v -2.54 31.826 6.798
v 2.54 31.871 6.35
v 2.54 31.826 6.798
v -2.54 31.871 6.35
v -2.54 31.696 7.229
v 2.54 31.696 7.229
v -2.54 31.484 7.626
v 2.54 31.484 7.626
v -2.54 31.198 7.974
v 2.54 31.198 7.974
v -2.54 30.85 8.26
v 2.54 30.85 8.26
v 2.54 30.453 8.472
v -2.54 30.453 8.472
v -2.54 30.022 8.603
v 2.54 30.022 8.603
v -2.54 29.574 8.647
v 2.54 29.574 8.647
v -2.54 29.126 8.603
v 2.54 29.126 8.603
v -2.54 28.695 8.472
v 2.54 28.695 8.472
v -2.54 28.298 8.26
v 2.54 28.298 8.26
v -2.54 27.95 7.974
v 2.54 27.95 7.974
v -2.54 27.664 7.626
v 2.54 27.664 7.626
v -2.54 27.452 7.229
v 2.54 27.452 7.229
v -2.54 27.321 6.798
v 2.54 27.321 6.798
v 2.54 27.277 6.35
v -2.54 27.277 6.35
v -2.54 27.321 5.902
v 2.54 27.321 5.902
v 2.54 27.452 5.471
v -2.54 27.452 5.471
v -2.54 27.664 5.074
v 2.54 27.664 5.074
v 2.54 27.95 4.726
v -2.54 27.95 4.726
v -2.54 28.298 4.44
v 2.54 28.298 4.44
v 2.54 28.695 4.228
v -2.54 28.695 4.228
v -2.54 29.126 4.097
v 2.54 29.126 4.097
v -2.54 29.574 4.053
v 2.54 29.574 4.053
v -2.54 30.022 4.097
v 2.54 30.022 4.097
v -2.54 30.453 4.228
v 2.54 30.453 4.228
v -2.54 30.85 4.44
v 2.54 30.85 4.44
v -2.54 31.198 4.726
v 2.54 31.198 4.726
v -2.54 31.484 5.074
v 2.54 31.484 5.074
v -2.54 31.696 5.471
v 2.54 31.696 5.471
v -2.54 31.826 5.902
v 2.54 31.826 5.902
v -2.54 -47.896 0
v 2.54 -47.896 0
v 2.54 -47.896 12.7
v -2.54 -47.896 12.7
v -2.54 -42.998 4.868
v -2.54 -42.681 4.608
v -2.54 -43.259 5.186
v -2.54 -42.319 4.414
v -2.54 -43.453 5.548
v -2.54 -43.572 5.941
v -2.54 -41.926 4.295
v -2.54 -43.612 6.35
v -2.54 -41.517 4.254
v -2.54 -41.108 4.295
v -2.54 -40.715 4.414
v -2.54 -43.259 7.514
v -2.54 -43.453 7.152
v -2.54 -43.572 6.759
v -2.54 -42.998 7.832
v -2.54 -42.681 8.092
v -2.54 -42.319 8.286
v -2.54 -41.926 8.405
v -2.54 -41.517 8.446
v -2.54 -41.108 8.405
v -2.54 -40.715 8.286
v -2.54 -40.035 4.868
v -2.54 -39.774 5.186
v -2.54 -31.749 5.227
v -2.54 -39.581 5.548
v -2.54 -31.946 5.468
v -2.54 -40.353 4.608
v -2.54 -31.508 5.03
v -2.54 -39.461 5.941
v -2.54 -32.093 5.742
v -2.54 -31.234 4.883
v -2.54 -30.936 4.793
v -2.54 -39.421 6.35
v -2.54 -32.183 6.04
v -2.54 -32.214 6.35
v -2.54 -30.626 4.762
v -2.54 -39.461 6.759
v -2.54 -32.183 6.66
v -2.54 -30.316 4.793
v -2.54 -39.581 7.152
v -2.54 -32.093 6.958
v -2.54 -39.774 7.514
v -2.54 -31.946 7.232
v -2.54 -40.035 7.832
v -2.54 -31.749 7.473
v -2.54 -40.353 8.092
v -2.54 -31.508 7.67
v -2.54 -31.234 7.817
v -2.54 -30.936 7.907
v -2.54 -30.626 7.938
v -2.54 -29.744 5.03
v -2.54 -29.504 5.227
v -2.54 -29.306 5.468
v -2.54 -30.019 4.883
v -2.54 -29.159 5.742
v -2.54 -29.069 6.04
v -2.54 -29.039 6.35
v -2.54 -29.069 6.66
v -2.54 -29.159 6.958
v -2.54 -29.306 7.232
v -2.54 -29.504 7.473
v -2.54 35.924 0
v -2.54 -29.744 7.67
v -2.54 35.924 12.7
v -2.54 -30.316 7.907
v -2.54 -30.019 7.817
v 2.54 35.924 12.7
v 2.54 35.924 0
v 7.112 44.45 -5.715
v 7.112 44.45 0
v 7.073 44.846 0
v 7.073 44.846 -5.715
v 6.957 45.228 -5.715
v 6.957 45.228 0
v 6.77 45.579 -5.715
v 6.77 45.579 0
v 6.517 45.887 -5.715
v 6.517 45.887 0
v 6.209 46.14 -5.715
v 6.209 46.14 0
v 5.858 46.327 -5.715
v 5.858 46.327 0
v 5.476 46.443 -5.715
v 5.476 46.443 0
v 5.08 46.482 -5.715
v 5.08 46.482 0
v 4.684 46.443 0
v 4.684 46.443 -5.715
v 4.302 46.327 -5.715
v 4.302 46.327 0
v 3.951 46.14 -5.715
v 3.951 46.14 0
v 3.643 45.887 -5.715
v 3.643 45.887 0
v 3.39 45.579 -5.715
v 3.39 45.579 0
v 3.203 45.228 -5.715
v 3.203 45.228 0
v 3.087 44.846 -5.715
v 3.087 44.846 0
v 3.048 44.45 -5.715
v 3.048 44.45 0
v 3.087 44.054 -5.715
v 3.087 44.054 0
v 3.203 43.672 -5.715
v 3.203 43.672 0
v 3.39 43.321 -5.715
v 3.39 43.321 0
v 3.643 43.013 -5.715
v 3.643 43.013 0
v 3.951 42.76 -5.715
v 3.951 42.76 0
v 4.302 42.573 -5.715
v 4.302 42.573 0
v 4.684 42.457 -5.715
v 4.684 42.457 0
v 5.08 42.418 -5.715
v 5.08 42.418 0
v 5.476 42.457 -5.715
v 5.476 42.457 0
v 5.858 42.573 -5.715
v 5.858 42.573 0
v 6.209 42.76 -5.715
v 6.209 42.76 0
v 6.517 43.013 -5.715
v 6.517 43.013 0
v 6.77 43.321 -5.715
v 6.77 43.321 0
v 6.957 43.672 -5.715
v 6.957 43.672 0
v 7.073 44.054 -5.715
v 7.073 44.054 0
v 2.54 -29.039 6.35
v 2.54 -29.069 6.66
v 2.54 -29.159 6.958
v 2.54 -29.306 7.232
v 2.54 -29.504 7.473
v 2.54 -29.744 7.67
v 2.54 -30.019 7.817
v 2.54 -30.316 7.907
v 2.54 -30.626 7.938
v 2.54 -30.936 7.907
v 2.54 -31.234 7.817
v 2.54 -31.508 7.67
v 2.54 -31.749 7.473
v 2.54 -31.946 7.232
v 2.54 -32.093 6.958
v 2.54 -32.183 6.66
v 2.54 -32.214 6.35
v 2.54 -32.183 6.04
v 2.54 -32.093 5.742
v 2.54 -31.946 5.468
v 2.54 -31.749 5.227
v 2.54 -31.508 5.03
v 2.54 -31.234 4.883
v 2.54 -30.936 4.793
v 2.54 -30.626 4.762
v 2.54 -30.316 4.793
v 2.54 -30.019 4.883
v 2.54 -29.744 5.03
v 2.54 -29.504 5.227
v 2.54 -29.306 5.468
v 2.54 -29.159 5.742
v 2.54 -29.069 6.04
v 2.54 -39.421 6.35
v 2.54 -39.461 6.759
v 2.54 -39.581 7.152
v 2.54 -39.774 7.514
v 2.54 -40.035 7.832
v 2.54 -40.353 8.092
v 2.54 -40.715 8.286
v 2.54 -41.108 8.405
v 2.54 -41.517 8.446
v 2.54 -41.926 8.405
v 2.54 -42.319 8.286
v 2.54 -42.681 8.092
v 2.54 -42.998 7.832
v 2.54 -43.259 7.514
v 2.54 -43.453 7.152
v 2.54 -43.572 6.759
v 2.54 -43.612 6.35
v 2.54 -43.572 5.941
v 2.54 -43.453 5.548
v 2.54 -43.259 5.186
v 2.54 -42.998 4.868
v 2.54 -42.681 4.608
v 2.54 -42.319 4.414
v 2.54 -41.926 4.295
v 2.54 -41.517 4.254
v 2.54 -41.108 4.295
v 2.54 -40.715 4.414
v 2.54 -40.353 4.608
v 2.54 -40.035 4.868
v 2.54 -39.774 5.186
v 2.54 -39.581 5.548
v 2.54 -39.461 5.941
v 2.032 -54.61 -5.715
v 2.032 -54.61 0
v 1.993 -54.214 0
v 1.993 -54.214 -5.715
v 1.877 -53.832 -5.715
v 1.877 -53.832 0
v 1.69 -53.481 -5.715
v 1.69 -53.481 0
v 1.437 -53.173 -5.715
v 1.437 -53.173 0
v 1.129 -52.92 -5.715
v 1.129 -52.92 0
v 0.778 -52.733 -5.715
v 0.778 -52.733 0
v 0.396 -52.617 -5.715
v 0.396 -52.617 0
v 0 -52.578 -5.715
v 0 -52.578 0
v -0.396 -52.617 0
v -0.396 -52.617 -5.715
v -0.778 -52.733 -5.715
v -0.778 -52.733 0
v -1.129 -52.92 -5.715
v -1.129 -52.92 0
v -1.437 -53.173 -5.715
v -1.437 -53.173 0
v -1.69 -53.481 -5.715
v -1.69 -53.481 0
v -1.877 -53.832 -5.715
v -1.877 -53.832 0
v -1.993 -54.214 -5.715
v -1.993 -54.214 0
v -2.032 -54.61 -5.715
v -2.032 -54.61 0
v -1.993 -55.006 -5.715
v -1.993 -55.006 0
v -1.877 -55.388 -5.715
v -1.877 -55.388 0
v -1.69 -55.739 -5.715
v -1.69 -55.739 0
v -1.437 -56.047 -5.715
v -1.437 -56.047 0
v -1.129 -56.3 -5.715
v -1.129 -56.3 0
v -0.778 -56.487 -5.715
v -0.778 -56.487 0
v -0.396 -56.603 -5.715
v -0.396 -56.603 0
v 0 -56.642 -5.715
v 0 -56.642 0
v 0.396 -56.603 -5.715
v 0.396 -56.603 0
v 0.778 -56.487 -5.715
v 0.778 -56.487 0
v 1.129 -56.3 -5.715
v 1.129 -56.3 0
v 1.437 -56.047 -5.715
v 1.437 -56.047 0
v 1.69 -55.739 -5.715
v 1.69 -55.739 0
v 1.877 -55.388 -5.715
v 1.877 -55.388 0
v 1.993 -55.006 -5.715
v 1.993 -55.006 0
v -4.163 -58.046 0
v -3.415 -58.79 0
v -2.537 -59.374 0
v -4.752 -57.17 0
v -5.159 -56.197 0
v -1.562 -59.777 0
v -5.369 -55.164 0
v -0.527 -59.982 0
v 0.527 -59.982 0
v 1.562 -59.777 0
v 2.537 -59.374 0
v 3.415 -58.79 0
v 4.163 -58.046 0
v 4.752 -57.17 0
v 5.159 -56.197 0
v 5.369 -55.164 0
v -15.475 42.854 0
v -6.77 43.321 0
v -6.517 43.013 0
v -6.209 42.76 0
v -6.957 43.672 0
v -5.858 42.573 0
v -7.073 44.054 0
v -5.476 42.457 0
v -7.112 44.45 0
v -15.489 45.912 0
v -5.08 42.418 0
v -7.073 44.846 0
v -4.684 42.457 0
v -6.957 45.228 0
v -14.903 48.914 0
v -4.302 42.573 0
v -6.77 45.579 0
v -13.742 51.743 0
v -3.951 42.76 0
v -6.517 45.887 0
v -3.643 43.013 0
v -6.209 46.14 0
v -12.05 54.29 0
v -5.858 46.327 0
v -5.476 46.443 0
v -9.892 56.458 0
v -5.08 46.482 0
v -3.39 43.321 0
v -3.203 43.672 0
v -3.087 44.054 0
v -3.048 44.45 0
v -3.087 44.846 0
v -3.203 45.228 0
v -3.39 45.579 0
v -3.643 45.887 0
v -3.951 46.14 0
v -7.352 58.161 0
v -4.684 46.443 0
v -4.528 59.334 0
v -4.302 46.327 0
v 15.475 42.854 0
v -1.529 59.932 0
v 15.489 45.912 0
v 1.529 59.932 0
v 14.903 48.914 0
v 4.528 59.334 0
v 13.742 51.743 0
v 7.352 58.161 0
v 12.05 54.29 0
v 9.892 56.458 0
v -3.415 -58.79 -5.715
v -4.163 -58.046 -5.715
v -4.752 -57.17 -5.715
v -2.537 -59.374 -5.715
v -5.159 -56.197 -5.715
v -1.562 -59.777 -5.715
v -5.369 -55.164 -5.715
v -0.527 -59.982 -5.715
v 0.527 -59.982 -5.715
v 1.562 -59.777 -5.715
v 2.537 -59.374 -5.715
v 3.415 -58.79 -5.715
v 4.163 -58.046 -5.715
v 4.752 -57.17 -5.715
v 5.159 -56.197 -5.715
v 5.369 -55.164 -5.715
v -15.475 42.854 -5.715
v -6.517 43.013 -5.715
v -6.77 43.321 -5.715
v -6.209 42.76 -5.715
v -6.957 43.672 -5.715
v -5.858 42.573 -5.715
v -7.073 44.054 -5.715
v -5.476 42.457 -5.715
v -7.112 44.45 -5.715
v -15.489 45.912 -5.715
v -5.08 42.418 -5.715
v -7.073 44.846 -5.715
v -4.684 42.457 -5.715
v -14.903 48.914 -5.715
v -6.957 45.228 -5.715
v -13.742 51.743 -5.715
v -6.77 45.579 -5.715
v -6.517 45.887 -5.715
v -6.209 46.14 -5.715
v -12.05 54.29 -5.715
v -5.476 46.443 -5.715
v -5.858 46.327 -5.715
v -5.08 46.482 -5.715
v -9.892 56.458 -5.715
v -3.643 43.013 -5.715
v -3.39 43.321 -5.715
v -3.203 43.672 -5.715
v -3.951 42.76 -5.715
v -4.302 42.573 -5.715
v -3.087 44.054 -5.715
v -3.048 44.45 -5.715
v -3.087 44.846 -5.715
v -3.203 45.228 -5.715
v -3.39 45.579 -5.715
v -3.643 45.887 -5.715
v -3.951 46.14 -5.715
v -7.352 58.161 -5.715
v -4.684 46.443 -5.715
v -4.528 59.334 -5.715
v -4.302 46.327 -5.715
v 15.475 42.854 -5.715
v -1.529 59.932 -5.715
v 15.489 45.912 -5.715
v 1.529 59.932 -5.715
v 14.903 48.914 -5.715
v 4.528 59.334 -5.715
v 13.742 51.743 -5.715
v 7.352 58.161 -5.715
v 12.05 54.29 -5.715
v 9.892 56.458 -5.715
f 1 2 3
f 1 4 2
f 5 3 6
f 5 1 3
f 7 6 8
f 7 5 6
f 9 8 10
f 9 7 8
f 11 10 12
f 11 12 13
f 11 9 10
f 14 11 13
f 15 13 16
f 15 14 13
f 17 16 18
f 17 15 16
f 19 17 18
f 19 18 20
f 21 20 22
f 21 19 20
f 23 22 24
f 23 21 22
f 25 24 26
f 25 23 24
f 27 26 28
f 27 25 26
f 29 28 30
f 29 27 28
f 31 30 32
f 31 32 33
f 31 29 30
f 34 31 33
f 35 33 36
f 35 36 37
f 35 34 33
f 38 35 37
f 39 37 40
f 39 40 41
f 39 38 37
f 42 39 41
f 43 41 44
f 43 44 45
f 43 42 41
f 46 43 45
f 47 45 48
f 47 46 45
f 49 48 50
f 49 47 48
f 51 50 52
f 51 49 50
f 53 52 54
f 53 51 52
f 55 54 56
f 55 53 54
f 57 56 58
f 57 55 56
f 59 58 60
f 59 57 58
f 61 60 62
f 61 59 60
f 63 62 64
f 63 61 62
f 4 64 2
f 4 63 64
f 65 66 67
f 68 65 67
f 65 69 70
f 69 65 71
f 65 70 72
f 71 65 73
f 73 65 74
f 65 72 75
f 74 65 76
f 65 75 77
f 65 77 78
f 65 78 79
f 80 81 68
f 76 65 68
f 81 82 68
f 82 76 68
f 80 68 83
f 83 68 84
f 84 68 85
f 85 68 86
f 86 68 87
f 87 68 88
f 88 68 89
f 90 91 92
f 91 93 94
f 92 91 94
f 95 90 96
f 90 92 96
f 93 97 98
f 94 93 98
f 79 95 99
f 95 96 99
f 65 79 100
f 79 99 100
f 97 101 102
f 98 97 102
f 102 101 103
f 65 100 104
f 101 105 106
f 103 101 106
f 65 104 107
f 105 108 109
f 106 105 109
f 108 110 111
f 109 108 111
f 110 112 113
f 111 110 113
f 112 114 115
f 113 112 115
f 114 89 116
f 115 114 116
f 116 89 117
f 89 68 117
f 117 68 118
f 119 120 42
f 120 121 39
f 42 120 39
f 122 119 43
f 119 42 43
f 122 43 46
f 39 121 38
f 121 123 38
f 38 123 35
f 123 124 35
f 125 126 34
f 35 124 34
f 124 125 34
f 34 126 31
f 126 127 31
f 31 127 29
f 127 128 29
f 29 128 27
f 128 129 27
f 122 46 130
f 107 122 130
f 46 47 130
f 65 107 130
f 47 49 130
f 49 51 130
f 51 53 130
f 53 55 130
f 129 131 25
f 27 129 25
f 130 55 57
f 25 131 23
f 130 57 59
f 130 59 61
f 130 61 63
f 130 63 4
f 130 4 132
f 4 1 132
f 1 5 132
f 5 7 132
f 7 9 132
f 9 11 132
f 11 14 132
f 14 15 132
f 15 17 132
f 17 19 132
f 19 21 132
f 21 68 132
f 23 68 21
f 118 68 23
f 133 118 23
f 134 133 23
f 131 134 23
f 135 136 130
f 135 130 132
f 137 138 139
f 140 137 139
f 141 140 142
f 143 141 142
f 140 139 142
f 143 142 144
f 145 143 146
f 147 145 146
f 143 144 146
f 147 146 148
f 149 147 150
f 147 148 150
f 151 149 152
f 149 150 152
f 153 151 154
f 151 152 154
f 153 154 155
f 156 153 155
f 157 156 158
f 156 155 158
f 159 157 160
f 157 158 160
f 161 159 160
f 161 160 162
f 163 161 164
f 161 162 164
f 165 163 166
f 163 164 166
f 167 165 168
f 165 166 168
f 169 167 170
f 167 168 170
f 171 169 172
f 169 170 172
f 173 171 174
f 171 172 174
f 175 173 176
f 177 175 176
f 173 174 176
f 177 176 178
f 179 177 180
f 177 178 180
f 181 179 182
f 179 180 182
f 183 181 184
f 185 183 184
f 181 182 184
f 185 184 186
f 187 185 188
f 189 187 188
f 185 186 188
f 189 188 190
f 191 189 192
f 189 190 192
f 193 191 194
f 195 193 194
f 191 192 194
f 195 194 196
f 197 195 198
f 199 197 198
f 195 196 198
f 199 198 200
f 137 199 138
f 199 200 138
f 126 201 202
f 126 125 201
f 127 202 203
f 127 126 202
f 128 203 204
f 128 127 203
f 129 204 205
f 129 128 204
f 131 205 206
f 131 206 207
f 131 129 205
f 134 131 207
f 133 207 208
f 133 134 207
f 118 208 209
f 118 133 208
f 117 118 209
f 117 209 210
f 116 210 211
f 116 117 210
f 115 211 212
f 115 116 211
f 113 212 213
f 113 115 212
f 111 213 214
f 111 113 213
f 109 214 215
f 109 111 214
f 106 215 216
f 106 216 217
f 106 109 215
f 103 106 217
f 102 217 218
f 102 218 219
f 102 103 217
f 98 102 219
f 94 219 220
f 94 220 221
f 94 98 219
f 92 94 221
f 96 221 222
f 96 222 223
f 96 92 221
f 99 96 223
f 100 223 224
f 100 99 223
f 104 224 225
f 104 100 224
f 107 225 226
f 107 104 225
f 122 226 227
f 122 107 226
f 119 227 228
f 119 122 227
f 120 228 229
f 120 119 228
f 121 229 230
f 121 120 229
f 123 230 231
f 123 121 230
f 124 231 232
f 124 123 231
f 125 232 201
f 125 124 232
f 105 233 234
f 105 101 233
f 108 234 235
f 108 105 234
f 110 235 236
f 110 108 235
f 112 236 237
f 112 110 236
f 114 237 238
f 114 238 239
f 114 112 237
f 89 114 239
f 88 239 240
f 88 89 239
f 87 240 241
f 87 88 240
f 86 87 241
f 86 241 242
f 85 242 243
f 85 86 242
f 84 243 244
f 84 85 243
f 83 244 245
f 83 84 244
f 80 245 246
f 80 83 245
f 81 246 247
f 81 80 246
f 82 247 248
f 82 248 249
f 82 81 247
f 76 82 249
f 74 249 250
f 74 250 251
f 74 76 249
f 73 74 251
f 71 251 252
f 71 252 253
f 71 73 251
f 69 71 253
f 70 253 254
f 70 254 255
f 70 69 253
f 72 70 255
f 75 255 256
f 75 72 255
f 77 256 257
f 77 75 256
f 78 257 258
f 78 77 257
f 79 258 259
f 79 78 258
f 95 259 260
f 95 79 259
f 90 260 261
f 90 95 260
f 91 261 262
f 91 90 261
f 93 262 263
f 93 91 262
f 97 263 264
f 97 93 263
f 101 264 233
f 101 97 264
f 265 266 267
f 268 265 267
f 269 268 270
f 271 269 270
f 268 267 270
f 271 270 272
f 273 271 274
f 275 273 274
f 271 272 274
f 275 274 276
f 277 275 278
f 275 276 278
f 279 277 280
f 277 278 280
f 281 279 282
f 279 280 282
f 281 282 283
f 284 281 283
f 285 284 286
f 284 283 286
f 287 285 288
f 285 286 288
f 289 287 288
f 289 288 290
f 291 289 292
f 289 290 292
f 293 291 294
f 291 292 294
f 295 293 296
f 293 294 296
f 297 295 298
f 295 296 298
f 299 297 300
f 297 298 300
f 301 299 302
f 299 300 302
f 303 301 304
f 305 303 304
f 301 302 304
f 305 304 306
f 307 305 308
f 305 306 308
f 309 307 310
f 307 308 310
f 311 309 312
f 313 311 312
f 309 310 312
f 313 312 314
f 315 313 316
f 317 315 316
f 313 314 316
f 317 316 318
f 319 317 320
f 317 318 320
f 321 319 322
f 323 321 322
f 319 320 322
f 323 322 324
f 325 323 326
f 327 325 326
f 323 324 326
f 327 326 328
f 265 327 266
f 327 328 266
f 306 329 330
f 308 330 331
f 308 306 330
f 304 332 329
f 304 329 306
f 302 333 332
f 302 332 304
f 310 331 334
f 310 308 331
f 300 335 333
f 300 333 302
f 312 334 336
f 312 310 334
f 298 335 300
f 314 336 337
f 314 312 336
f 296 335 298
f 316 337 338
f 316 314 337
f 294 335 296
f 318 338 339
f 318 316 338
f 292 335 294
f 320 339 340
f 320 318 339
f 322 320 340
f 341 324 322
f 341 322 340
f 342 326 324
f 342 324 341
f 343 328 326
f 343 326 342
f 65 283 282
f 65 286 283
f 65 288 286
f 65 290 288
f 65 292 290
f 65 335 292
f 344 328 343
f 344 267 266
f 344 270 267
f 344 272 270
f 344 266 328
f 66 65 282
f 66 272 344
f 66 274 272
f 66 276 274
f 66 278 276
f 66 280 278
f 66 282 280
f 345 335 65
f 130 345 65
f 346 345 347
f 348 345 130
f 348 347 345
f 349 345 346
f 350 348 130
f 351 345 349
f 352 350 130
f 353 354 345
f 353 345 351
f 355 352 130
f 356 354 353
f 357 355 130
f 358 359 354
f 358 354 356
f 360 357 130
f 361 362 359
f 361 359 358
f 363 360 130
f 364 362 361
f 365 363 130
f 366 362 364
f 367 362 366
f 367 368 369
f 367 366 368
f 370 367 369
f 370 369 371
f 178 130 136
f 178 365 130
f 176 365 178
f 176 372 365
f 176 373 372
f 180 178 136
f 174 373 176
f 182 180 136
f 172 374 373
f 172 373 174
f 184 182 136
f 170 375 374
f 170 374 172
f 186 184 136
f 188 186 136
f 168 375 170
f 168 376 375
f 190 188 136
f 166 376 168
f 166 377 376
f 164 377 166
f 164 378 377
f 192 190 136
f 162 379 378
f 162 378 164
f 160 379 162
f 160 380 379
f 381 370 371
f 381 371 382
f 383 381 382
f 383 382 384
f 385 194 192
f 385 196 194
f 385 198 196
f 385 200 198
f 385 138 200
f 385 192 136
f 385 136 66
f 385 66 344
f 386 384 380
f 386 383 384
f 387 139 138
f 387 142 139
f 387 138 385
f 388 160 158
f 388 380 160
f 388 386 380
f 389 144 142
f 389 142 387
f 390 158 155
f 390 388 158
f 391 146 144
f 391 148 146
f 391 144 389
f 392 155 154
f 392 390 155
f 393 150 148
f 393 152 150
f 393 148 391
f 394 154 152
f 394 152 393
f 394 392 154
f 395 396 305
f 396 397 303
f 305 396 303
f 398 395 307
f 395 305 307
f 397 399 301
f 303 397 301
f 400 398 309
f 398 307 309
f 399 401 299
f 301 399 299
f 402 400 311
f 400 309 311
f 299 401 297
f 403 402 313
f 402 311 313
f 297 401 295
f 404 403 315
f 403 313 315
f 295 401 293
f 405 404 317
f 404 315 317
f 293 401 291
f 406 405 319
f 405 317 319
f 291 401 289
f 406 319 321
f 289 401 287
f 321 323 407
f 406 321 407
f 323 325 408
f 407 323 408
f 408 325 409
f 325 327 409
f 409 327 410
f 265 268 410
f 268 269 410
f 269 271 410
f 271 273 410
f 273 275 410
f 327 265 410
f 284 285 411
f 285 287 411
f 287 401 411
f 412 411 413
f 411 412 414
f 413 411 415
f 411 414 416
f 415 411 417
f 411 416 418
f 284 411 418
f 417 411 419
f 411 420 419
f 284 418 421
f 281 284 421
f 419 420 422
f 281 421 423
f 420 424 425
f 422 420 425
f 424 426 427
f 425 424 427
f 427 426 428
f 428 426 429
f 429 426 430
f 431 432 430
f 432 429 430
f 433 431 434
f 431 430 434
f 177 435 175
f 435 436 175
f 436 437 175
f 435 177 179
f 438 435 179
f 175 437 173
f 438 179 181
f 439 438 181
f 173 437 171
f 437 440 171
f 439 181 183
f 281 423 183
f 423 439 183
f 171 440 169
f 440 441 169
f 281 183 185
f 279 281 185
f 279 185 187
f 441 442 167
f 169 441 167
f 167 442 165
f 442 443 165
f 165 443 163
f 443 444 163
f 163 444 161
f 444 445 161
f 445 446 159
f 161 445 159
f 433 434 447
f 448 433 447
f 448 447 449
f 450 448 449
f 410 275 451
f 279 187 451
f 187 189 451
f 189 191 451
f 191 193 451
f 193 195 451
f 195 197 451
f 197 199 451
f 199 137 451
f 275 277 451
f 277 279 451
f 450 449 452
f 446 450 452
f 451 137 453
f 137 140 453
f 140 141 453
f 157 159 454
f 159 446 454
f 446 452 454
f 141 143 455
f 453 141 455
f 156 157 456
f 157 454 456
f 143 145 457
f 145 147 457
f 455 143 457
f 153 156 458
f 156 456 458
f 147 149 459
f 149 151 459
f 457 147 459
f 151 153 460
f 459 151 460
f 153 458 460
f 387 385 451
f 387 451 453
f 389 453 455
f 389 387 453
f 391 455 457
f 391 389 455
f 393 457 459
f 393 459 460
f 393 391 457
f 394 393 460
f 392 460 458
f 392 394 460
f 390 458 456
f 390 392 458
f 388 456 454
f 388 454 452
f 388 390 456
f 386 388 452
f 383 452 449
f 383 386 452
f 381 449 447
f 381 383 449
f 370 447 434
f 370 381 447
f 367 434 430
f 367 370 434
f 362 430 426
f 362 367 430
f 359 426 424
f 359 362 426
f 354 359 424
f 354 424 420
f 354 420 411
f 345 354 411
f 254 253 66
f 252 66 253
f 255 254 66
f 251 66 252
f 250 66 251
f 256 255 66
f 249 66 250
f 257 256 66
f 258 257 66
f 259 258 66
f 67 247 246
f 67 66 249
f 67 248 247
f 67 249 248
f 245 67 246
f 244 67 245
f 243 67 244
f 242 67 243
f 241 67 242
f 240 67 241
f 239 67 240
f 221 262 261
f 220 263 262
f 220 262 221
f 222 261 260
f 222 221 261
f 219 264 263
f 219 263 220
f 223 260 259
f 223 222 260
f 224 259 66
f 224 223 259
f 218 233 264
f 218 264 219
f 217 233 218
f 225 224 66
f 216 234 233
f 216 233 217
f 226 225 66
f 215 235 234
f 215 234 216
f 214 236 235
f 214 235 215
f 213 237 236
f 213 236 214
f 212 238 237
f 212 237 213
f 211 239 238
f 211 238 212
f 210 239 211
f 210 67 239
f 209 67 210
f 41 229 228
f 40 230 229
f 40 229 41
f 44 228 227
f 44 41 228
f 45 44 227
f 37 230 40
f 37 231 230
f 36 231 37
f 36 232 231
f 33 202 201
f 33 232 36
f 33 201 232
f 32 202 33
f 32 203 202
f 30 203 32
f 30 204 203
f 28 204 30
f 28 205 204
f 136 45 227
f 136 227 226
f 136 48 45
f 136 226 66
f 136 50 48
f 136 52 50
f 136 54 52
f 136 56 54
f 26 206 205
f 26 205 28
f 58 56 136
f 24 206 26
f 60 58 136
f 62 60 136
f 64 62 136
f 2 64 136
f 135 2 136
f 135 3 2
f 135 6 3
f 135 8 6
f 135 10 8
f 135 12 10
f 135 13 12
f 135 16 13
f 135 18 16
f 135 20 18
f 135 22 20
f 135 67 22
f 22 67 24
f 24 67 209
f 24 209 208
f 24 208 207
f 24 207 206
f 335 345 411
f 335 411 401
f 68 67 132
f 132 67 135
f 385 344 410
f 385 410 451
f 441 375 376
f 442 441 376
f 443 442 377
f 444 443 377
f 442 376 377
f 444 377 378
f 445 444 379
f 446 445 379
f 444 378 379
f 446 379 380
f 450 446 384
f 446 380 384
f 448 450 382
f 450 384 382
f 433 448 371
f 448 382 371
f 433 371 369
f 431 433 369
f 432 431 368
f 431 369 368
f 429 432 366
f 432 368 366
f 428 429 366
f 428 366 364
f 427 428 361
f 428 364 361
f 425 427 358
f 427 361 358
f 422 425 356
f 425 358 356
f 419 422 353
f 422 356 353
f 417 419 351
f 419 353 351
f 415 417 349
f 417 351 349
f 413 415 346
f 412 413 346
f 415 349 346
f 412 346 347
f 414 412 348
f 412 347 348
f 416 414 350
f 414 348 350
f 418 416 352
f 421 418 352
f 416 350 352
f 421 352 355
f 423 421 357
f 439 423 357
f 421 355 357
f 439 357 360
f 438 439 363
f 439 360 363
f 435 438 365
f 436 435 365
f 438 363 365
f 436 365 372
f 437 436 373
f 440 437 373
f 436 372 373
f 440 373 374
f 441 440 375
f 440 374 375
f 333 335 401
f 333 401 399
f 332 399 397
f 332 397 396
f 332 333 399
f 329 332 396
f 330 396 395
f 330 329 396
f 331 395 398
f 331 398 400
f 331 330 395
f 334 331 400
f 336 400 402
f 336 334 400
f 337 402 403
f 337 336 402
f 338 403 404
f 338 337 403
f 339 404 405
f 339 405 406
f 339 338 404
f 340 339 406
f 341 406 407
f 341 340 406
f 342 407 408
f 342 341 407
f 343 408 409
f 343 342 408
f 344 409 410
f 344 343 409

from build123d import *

# Parameters (mm, degrees)
F0_R     = 2.032
F1_DEPTH = 5.715
F2_W     = 83.82
F2_H     = 12.7
F2_R     = 2.0955
F2_R_2   = 1.5875
F2_R_3   = 2.296673
F3_DEPTH = 2.54


with BuildPart() as f1:
    # F0 (on Top) → F1 (new body)
    with BuildSketch(Plane.XY):
        with BuildLine():
            Line((-15.475456, 42.854359), (-5.369036, -55.16359))
            ThreePointArc((-5.369036, -55.16359), (0, -60.0075), (5.369036, -55.16359))
            Line((5.369036, -55.16359), (15.475456, 42.854359))
            ThreePointArc((15.475456, 42.854359), (0, 60.0075), (-15.475456, 42.854359))
        make_face()
        with Locations((0, -54.61)):
            Circle(F0_R, mode=Mode.SUBTRACT)
        with Locations((-5.08, 44.45)):
            Circle(F0_R, mode=Mode.SUBTRACT)
        with Locations((5.08, 44.45)):
            Circle(F0_R, mode=Mode.SUBTRACT)
    extrude(amount=-F1_DEPTH)

    # F2 (on Right) → F3 (join, symmetric)
    with BuildSketch(Plane.YZ):
        with Locations((-5.986101, 6.35)):
            Rectangle(F2_W, F2_H)
        with Locations((-41.516703, 6.35)):
            Circle(F2_R, mode=Mode.SUBTRACT)
        with Locations((-30.626114, 6.35)):
            Circle(F2_R_2, mode=Mode.SUBTRACT)
        with Locations((29.573899, 6.35)):
            Circle(F2_R_3, mode=Mode.SUBTRACT)
    extrude(amount=F3_DEPTH, both=True)


solid = f1.part
